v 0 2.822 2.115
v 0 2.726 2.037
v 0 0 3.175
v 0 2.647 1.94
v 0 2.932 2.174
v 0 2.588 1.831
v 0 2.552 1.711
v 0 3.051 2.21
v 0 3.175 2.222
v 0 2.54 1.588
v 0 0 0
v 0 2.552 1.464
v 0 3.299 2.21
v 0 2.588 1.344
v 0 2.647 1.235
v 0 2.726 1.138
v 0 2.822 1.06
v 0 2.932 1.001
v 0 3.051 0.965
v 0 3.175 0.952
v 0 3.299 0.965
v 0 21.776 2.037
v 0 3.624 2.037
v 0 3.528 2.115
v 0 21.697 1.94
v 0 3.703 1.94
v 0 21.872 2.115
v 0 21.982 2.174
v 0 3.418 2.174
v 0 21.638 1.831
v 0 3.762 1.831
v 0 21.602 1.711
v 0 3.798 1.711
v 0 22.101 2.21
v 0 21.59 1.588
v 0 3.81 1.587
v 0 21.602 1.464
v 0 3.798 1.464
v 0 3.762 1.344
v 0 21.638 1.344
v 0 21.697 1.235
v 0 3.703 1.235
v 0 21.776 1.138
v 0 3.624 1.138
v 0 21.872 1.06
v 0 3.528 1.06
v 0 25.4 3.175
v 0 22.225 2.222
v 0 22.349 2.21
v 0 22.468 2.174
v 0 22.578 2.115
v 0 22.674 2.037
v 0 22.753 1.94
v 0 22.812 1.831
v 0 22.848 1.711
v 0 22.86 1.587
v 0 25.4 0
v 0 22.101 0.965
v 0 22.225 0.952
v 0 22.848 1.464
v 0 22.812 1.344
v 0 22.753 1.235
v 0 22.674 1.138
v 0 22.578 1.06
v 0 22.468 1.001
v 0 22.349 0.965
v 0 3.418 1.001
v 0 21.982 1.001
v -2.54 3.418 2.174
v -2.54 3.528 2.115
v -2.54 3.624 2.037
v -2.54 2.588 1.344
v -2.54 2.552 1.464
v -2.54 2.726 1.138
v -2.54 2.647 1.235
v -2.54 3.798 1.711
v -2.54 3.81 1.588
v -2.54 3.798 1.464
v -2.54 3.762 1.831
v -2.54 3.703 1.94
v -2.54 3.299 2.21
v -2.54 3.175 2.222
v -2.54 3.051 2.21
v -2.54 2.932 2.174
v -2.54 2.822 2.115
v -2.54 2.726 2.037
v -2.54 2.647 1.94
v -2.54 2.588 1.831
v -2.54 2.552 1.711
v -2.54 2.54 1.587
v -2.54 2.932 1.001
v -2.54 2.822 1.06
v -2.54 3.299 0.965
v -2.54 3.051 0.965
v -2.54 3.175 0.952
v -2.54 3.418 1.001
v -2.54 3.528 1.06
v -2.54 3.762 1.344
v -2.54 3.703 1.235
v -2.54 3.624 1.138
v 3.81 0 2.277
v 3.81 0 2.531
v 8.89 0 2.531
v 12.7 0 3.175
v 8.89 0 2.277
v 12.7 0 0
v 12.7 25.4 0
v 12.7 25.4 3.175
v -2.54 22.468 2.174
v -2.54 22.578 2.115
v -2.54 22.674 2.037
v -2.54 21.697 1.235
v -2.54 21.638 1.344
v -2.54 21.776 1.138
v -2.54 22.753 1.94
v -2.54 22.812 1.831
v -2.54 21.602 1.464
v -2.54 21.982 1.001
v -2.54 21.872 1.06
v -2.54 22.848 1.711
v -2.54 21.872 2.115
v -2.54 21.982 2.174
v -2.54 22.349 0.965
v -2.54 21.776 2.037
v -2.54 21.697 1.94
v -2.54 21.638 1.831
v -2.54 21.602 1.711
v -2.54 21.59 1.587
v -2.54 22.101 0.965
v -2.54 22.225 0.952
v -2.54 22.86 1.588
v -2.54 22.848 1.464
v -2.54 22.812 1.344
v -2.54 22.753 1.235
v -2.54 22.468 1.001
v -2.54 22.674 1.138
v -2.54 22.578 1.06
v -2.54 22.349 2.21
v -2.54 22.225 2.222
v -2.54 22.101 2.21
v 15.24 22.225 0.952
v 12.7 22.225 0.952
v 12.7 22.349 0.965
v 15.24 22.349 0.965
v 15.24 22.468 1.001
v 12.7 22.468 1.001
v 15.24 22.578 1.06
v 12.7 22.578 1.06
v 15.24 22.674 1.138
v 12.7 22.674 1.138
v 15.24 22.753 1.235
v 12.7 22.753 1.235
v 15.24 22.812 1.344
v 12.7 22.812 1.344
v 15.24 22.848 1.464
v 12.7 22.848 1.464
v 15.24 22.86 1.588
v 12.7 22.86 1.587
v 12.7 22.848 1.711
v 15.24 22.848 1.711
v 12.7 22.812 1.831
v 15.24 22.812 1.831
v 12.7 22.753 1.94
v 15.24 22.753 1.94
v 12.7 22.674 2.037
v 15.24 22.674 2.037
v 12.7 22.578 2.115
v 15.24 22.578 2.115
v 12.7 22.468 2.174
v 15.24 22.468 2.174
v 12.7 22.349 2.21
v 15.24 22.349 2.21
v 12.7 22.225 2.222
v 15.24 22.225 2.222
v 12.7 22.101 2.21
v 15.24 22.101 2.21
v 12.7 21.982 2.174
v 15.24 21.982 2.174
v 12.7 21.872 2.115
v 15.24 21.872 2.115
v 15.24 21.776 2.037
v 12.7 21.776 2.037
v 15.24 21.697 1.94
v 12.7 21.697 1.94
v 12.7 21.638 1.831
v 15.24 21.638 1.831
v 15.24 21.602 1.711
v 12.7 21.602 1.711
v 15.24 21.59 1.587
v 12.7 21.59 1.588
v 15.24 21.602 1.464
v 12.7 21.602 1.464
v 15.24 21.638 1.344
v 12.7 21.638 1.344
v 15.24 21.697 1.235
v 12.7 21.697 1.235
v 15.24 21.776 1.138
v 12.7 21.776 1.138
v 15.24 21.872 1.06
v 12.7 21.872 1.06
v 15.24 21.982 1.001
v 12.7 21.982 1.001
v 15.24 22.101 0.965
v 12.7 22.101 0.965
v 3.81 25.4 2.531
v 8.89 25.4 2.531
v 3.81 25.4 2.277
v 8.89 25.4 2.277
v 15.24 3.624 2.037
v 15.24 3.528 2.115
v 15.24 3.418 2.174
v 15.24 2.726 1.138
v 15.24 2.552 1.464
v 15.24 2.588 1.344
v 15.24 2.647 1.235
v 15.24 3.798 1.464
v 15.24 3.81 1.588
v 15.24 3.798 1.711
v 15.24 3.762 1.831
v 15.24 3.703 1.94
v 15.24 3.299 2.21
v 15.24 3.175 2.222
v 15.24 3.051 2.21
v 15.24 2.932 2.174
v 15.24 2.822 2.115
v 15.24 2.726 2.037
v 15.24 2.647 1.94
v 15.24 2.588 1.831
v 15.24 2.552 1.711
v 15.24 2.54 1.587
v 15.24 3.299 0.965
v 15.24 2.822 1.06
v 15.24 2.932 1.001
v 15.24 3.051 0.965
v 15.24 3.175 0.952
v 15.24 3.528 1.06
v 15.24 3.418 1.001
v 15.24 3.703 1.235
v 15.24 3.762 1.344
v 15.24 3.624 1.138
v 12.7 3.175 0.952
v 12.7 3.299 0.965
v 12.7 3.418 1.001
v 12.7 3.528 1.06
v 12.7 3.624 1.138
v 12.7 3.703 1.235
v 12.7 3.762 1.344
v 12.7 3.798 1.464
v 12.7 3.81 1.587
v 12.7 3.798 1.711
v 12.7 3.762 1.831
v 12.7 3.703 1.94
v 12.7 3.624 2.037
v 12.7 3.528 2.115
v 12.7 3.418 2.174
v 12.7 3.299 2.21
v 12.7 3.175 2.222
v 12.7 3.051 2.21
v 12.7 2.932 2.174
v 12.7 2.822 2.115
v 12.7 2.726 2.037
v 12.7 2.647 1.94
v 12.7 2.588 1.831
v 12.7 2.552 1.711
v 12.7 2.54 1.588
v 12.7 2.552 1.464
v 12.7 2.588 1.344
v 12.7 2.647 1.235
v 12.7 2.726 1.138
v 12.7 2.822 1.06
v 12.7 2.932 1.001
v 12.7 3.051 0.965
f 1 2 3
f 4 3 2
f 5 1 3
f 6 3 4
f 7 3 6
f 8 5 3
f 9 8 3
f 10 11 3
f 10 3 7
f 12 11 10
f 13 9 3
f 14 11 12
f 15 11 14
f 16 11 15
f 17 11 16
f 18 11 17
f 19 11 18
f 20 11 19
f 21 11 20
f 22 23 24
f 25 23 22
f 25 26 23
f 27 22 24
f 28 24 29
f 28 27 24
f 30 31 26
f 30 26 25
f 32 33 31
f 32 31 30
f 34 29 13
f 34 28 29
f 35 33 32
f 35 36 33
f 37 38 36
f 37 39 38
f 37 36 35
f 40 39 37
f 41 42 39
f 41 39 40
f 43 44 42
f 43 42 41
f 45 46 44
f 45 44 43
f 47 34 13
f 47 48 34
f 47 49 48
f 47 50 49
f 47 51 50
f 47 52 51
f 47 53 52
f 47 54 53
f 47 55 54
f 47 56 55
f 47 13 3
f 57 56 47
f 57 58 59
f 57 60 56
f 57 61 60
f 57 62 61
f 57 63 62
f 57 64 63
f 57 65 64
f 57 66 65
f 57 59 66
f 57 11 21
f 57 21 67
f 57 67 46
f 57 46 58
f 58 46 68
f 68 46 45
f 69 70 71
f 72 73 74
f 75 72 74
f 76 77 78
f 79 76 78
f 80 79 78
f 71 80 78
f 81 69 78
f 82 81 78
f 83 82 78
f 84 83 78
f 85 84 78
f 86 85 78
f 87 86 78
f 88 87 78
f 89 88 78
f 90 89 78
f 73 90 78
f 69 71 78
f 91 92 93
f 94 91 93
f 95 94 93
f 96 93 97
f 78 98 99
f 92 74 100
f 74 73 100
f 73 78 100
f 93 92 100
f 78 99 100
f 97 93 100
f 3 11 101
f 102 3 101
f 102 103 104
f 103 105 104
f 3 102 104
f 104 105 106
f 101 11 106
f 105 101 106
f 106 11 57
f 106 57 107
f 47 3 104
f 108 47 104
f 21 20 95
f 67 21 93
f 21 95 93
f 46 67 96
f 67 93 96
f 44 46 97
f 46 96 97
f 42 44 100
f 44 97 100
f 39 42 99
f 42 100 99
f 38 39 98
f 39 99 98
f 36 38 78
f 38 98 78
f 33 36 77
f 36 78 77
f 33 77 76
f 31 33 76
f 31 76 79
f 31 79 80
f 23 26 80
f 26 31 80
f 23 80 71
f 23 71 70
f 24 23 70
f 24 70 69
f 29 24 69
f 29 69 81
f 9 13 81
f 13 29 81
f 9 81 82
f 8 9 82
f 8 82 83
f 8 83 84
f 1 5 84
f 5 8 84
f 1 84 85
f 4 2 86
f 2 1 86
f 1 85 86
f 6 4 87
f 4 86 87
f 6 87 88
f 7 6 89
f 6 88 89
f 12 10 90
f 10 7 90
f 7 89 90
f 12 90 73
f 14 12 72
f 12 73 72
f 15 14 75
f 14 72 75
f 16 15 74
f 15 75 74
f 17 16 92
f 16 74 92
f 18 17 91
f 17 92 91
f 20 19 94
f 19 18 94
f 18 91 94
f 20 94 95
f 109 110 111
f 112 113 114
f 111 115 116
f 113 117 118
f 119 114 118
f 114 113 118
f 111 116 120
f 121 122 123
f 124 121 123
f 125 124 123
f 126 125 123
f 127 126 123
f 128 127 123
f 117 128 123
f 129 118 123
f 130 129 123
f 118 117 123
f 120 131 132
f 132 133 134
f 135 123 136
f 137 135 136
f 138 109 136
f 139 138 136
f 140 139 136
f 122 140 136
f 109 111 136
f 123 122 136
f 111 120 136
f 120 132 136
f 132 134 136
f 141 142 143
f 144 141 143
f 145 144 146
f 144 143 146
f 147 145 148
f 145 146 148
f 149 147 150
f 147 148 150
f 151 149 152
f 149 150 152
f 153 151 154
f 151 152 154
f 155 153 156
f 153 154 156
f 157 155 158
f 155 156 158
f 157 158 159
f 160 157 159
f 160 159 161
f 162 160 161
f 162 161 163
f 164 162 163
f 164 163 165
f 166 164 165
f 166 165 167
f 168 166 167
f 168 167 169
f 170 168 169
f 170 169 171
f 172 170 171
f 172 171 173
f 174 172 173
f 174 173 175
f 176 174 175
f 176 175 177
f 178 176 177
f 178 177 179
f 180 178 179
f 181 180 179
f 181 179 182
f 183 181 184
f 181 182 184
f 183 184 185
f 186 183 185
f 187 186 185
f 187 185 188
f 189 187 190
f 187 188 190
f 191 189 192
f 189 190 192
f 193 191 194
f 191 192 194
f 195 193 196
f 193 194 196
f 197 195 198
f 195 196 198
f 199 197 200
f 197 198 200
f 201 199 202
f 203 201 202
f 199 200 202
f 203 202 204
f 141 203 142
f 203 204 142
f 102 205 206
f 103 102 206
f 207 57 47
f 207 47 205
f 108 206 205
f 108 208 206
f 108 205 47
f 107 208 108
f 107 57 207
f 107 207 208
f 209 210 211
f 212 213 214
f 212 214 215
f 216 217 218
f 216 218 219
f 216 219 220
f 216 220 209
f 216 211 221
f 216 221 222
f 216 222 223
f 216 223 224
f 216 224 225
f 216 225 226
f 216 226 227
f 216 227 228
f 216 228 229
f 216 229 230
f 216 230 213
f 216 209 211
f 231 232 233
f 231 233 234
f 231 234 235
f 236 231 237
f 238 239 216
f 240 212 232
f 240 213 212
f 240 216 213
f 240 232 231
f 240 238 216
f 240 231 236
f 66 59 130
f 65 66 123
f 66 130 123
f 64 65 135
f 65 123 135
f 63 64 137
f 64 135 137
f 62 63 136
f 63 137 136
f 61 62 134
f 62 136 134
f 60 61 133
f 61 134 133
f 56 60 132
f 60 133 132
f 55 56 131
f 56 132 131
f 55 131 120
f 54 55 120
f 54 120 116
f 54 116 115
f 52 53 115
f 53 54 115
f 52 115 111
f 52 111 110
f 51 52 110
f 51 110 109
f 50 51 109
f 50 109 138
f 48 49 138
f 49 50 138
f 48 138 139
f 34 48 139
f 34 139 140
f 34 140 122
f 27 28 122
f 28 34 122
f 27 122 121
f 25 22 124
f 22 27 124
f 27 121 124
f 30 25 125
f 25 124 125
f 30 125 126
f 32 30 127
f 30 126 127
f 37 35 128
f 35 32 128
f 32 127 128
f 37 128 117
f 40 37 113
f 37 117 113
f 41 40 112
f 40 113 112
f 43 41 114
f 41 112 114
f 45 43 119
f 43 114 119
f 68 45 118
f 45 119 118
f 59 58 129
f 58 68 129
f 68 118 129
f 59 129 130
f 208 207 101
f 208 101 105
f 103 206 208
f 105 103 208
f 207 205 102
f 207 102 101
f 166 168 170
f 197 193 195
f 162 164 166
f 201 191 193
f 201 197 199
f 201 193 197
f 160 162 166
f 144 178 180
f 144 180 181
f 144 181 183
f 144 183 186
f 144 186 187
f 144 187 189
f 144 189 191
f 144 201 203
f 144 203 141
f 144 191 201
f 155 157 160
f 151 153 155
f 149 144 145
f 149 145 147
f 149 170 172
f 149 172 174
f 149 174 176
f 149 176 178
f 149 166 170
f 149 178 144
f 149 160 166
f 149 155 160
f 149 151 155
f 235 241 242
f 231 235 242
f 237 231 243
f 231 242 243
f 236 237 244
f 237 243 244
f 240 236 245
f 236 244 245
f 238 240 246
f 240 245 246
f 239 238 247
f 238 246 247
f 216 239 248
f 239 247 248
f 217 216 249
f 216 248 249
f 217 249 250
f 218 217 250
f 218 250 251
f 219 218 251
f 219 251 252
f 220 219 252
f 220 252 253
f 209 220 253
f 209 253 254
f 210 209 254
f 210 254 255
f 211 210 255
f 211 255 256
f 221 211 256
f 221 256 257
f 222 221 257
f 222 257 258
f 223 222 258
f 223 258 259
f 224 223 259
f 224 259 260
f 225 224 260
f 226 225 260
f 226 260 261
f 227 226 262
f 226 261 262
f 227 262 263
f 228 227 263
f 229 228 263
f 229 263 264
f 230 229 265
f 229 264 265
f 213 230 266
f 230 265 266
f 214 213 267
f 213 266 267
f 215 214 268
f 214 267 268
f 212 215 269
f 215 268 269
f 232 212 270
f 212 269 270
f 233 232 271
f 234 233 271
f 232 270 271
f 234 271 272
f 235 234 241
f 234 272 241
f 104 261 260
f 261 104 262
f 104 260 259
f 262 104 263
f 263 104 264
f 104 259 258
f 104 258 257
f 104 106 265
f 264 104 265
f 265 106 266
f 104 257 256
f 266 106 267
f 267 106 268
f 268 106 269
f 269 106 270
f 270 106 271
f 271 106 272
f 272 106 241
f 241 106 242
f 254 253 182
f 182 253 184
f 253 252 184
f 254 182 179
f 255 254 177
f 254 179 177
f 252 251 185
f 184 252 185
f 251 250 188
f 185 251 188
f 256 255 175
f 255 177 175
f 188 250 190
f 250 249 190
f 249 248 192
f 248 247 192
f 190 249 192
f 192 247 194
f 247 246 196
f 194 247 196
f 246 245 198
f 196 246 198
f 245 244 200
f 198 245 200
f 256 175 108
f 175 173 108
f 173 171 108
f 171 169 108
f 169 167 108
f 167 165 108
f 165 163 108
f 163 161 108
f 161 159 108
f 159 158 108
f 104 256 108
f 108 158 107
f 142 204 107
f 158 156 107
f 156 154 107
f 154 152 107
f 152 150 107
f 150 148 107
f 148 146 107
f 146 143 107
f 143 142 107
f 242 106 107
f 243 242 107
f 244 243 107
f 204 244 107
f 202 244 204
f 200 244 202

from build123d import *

# Parameters (mm, degrees)
SKETCH1_W                = 12.7
SKETCH1_H                = 25.4
BOSS_EXTRUDE1_DEPTH      = 3.175
BOSS_EXTRUDE3_DEPTH      = 2.54
BOSS_EXTRUDE3_DEPTH_BACK = 15.24
SKETCH2_R                = 0.635
BOSS_EXTRUDE5_DEPTH      = 2.54
BOSS_EXTRUDE5_DEPTH_BACK = 15.24
SKETCH6_R                = 0.635
SKETCH7_W                = 5.08
SKETCH7_H                = 0.254
CUT_EXTRUDE1_DEPTH       = 30.790908429


with BuildPart() as part:
    # Sketch1 → Boss-Extrude1 (new body)
    with BuildSketch(Plane.XY):
        with Locations((6.35, 12.7)):
            Rectangle(SKETCH1_W, SKETCH1_H)
    extrude(amount=BOSS_EXTRUDE1_DEPTH)

    # Sketch2 → Boss-Extrude3 (add, two sides: drawn at the far end of the back side and taken through both)
    with BuildSketch(Plane(origin=(12.7, 0, 0), x_dir=(0, 0, -1), z_dir=(1, 0, 0)).offset(-BOSS_EXTRUDE3_DEPTH_BACK)):
        with Locations((-1.5875, 22.225)):
            Circle(SKETCH2_R)
    extrude(amount=BOSS_EXTRUDE3_DEPTH + BOSS_EXTRUDE3_DEPTH_BACK)

    # Sketch6 → Boss-Extrude5 (add, two sides: drawn at the far end of the back side and taken through both)
    with BuildSketch(Plane(origin=(12.7, 0, 0), x_dir=(0, 0, -1), z_dir=(1, 0, 0)).offset(-BOSS_EXTRUDE5_DEPTH_BACK)):
        with Locations((-1.5875, 3.175)):
            Circle(SKETCH6_R)
    extrude(amount=BOSS_EXTRUDE5_DEPTH + BOSS_EXTRUDE5_DEPTH_BACK)

    # Sketch7 → Cut-Extrude1 (cut, through all)
    with BuildSketch(Plane(origin=(0, 25.4, 0), x_dir=(1, 0, 0), z_dir=(0, 1, 0))):
        with Locations((6.35, -2.403553661)):
            Rectangle(SKETCH7_W, SKETCH7_H)
    extrude(amount=-CUT_EXTRUDE1_DEPTH, mode=Mode.SUBTRACT)


solid = part.part
